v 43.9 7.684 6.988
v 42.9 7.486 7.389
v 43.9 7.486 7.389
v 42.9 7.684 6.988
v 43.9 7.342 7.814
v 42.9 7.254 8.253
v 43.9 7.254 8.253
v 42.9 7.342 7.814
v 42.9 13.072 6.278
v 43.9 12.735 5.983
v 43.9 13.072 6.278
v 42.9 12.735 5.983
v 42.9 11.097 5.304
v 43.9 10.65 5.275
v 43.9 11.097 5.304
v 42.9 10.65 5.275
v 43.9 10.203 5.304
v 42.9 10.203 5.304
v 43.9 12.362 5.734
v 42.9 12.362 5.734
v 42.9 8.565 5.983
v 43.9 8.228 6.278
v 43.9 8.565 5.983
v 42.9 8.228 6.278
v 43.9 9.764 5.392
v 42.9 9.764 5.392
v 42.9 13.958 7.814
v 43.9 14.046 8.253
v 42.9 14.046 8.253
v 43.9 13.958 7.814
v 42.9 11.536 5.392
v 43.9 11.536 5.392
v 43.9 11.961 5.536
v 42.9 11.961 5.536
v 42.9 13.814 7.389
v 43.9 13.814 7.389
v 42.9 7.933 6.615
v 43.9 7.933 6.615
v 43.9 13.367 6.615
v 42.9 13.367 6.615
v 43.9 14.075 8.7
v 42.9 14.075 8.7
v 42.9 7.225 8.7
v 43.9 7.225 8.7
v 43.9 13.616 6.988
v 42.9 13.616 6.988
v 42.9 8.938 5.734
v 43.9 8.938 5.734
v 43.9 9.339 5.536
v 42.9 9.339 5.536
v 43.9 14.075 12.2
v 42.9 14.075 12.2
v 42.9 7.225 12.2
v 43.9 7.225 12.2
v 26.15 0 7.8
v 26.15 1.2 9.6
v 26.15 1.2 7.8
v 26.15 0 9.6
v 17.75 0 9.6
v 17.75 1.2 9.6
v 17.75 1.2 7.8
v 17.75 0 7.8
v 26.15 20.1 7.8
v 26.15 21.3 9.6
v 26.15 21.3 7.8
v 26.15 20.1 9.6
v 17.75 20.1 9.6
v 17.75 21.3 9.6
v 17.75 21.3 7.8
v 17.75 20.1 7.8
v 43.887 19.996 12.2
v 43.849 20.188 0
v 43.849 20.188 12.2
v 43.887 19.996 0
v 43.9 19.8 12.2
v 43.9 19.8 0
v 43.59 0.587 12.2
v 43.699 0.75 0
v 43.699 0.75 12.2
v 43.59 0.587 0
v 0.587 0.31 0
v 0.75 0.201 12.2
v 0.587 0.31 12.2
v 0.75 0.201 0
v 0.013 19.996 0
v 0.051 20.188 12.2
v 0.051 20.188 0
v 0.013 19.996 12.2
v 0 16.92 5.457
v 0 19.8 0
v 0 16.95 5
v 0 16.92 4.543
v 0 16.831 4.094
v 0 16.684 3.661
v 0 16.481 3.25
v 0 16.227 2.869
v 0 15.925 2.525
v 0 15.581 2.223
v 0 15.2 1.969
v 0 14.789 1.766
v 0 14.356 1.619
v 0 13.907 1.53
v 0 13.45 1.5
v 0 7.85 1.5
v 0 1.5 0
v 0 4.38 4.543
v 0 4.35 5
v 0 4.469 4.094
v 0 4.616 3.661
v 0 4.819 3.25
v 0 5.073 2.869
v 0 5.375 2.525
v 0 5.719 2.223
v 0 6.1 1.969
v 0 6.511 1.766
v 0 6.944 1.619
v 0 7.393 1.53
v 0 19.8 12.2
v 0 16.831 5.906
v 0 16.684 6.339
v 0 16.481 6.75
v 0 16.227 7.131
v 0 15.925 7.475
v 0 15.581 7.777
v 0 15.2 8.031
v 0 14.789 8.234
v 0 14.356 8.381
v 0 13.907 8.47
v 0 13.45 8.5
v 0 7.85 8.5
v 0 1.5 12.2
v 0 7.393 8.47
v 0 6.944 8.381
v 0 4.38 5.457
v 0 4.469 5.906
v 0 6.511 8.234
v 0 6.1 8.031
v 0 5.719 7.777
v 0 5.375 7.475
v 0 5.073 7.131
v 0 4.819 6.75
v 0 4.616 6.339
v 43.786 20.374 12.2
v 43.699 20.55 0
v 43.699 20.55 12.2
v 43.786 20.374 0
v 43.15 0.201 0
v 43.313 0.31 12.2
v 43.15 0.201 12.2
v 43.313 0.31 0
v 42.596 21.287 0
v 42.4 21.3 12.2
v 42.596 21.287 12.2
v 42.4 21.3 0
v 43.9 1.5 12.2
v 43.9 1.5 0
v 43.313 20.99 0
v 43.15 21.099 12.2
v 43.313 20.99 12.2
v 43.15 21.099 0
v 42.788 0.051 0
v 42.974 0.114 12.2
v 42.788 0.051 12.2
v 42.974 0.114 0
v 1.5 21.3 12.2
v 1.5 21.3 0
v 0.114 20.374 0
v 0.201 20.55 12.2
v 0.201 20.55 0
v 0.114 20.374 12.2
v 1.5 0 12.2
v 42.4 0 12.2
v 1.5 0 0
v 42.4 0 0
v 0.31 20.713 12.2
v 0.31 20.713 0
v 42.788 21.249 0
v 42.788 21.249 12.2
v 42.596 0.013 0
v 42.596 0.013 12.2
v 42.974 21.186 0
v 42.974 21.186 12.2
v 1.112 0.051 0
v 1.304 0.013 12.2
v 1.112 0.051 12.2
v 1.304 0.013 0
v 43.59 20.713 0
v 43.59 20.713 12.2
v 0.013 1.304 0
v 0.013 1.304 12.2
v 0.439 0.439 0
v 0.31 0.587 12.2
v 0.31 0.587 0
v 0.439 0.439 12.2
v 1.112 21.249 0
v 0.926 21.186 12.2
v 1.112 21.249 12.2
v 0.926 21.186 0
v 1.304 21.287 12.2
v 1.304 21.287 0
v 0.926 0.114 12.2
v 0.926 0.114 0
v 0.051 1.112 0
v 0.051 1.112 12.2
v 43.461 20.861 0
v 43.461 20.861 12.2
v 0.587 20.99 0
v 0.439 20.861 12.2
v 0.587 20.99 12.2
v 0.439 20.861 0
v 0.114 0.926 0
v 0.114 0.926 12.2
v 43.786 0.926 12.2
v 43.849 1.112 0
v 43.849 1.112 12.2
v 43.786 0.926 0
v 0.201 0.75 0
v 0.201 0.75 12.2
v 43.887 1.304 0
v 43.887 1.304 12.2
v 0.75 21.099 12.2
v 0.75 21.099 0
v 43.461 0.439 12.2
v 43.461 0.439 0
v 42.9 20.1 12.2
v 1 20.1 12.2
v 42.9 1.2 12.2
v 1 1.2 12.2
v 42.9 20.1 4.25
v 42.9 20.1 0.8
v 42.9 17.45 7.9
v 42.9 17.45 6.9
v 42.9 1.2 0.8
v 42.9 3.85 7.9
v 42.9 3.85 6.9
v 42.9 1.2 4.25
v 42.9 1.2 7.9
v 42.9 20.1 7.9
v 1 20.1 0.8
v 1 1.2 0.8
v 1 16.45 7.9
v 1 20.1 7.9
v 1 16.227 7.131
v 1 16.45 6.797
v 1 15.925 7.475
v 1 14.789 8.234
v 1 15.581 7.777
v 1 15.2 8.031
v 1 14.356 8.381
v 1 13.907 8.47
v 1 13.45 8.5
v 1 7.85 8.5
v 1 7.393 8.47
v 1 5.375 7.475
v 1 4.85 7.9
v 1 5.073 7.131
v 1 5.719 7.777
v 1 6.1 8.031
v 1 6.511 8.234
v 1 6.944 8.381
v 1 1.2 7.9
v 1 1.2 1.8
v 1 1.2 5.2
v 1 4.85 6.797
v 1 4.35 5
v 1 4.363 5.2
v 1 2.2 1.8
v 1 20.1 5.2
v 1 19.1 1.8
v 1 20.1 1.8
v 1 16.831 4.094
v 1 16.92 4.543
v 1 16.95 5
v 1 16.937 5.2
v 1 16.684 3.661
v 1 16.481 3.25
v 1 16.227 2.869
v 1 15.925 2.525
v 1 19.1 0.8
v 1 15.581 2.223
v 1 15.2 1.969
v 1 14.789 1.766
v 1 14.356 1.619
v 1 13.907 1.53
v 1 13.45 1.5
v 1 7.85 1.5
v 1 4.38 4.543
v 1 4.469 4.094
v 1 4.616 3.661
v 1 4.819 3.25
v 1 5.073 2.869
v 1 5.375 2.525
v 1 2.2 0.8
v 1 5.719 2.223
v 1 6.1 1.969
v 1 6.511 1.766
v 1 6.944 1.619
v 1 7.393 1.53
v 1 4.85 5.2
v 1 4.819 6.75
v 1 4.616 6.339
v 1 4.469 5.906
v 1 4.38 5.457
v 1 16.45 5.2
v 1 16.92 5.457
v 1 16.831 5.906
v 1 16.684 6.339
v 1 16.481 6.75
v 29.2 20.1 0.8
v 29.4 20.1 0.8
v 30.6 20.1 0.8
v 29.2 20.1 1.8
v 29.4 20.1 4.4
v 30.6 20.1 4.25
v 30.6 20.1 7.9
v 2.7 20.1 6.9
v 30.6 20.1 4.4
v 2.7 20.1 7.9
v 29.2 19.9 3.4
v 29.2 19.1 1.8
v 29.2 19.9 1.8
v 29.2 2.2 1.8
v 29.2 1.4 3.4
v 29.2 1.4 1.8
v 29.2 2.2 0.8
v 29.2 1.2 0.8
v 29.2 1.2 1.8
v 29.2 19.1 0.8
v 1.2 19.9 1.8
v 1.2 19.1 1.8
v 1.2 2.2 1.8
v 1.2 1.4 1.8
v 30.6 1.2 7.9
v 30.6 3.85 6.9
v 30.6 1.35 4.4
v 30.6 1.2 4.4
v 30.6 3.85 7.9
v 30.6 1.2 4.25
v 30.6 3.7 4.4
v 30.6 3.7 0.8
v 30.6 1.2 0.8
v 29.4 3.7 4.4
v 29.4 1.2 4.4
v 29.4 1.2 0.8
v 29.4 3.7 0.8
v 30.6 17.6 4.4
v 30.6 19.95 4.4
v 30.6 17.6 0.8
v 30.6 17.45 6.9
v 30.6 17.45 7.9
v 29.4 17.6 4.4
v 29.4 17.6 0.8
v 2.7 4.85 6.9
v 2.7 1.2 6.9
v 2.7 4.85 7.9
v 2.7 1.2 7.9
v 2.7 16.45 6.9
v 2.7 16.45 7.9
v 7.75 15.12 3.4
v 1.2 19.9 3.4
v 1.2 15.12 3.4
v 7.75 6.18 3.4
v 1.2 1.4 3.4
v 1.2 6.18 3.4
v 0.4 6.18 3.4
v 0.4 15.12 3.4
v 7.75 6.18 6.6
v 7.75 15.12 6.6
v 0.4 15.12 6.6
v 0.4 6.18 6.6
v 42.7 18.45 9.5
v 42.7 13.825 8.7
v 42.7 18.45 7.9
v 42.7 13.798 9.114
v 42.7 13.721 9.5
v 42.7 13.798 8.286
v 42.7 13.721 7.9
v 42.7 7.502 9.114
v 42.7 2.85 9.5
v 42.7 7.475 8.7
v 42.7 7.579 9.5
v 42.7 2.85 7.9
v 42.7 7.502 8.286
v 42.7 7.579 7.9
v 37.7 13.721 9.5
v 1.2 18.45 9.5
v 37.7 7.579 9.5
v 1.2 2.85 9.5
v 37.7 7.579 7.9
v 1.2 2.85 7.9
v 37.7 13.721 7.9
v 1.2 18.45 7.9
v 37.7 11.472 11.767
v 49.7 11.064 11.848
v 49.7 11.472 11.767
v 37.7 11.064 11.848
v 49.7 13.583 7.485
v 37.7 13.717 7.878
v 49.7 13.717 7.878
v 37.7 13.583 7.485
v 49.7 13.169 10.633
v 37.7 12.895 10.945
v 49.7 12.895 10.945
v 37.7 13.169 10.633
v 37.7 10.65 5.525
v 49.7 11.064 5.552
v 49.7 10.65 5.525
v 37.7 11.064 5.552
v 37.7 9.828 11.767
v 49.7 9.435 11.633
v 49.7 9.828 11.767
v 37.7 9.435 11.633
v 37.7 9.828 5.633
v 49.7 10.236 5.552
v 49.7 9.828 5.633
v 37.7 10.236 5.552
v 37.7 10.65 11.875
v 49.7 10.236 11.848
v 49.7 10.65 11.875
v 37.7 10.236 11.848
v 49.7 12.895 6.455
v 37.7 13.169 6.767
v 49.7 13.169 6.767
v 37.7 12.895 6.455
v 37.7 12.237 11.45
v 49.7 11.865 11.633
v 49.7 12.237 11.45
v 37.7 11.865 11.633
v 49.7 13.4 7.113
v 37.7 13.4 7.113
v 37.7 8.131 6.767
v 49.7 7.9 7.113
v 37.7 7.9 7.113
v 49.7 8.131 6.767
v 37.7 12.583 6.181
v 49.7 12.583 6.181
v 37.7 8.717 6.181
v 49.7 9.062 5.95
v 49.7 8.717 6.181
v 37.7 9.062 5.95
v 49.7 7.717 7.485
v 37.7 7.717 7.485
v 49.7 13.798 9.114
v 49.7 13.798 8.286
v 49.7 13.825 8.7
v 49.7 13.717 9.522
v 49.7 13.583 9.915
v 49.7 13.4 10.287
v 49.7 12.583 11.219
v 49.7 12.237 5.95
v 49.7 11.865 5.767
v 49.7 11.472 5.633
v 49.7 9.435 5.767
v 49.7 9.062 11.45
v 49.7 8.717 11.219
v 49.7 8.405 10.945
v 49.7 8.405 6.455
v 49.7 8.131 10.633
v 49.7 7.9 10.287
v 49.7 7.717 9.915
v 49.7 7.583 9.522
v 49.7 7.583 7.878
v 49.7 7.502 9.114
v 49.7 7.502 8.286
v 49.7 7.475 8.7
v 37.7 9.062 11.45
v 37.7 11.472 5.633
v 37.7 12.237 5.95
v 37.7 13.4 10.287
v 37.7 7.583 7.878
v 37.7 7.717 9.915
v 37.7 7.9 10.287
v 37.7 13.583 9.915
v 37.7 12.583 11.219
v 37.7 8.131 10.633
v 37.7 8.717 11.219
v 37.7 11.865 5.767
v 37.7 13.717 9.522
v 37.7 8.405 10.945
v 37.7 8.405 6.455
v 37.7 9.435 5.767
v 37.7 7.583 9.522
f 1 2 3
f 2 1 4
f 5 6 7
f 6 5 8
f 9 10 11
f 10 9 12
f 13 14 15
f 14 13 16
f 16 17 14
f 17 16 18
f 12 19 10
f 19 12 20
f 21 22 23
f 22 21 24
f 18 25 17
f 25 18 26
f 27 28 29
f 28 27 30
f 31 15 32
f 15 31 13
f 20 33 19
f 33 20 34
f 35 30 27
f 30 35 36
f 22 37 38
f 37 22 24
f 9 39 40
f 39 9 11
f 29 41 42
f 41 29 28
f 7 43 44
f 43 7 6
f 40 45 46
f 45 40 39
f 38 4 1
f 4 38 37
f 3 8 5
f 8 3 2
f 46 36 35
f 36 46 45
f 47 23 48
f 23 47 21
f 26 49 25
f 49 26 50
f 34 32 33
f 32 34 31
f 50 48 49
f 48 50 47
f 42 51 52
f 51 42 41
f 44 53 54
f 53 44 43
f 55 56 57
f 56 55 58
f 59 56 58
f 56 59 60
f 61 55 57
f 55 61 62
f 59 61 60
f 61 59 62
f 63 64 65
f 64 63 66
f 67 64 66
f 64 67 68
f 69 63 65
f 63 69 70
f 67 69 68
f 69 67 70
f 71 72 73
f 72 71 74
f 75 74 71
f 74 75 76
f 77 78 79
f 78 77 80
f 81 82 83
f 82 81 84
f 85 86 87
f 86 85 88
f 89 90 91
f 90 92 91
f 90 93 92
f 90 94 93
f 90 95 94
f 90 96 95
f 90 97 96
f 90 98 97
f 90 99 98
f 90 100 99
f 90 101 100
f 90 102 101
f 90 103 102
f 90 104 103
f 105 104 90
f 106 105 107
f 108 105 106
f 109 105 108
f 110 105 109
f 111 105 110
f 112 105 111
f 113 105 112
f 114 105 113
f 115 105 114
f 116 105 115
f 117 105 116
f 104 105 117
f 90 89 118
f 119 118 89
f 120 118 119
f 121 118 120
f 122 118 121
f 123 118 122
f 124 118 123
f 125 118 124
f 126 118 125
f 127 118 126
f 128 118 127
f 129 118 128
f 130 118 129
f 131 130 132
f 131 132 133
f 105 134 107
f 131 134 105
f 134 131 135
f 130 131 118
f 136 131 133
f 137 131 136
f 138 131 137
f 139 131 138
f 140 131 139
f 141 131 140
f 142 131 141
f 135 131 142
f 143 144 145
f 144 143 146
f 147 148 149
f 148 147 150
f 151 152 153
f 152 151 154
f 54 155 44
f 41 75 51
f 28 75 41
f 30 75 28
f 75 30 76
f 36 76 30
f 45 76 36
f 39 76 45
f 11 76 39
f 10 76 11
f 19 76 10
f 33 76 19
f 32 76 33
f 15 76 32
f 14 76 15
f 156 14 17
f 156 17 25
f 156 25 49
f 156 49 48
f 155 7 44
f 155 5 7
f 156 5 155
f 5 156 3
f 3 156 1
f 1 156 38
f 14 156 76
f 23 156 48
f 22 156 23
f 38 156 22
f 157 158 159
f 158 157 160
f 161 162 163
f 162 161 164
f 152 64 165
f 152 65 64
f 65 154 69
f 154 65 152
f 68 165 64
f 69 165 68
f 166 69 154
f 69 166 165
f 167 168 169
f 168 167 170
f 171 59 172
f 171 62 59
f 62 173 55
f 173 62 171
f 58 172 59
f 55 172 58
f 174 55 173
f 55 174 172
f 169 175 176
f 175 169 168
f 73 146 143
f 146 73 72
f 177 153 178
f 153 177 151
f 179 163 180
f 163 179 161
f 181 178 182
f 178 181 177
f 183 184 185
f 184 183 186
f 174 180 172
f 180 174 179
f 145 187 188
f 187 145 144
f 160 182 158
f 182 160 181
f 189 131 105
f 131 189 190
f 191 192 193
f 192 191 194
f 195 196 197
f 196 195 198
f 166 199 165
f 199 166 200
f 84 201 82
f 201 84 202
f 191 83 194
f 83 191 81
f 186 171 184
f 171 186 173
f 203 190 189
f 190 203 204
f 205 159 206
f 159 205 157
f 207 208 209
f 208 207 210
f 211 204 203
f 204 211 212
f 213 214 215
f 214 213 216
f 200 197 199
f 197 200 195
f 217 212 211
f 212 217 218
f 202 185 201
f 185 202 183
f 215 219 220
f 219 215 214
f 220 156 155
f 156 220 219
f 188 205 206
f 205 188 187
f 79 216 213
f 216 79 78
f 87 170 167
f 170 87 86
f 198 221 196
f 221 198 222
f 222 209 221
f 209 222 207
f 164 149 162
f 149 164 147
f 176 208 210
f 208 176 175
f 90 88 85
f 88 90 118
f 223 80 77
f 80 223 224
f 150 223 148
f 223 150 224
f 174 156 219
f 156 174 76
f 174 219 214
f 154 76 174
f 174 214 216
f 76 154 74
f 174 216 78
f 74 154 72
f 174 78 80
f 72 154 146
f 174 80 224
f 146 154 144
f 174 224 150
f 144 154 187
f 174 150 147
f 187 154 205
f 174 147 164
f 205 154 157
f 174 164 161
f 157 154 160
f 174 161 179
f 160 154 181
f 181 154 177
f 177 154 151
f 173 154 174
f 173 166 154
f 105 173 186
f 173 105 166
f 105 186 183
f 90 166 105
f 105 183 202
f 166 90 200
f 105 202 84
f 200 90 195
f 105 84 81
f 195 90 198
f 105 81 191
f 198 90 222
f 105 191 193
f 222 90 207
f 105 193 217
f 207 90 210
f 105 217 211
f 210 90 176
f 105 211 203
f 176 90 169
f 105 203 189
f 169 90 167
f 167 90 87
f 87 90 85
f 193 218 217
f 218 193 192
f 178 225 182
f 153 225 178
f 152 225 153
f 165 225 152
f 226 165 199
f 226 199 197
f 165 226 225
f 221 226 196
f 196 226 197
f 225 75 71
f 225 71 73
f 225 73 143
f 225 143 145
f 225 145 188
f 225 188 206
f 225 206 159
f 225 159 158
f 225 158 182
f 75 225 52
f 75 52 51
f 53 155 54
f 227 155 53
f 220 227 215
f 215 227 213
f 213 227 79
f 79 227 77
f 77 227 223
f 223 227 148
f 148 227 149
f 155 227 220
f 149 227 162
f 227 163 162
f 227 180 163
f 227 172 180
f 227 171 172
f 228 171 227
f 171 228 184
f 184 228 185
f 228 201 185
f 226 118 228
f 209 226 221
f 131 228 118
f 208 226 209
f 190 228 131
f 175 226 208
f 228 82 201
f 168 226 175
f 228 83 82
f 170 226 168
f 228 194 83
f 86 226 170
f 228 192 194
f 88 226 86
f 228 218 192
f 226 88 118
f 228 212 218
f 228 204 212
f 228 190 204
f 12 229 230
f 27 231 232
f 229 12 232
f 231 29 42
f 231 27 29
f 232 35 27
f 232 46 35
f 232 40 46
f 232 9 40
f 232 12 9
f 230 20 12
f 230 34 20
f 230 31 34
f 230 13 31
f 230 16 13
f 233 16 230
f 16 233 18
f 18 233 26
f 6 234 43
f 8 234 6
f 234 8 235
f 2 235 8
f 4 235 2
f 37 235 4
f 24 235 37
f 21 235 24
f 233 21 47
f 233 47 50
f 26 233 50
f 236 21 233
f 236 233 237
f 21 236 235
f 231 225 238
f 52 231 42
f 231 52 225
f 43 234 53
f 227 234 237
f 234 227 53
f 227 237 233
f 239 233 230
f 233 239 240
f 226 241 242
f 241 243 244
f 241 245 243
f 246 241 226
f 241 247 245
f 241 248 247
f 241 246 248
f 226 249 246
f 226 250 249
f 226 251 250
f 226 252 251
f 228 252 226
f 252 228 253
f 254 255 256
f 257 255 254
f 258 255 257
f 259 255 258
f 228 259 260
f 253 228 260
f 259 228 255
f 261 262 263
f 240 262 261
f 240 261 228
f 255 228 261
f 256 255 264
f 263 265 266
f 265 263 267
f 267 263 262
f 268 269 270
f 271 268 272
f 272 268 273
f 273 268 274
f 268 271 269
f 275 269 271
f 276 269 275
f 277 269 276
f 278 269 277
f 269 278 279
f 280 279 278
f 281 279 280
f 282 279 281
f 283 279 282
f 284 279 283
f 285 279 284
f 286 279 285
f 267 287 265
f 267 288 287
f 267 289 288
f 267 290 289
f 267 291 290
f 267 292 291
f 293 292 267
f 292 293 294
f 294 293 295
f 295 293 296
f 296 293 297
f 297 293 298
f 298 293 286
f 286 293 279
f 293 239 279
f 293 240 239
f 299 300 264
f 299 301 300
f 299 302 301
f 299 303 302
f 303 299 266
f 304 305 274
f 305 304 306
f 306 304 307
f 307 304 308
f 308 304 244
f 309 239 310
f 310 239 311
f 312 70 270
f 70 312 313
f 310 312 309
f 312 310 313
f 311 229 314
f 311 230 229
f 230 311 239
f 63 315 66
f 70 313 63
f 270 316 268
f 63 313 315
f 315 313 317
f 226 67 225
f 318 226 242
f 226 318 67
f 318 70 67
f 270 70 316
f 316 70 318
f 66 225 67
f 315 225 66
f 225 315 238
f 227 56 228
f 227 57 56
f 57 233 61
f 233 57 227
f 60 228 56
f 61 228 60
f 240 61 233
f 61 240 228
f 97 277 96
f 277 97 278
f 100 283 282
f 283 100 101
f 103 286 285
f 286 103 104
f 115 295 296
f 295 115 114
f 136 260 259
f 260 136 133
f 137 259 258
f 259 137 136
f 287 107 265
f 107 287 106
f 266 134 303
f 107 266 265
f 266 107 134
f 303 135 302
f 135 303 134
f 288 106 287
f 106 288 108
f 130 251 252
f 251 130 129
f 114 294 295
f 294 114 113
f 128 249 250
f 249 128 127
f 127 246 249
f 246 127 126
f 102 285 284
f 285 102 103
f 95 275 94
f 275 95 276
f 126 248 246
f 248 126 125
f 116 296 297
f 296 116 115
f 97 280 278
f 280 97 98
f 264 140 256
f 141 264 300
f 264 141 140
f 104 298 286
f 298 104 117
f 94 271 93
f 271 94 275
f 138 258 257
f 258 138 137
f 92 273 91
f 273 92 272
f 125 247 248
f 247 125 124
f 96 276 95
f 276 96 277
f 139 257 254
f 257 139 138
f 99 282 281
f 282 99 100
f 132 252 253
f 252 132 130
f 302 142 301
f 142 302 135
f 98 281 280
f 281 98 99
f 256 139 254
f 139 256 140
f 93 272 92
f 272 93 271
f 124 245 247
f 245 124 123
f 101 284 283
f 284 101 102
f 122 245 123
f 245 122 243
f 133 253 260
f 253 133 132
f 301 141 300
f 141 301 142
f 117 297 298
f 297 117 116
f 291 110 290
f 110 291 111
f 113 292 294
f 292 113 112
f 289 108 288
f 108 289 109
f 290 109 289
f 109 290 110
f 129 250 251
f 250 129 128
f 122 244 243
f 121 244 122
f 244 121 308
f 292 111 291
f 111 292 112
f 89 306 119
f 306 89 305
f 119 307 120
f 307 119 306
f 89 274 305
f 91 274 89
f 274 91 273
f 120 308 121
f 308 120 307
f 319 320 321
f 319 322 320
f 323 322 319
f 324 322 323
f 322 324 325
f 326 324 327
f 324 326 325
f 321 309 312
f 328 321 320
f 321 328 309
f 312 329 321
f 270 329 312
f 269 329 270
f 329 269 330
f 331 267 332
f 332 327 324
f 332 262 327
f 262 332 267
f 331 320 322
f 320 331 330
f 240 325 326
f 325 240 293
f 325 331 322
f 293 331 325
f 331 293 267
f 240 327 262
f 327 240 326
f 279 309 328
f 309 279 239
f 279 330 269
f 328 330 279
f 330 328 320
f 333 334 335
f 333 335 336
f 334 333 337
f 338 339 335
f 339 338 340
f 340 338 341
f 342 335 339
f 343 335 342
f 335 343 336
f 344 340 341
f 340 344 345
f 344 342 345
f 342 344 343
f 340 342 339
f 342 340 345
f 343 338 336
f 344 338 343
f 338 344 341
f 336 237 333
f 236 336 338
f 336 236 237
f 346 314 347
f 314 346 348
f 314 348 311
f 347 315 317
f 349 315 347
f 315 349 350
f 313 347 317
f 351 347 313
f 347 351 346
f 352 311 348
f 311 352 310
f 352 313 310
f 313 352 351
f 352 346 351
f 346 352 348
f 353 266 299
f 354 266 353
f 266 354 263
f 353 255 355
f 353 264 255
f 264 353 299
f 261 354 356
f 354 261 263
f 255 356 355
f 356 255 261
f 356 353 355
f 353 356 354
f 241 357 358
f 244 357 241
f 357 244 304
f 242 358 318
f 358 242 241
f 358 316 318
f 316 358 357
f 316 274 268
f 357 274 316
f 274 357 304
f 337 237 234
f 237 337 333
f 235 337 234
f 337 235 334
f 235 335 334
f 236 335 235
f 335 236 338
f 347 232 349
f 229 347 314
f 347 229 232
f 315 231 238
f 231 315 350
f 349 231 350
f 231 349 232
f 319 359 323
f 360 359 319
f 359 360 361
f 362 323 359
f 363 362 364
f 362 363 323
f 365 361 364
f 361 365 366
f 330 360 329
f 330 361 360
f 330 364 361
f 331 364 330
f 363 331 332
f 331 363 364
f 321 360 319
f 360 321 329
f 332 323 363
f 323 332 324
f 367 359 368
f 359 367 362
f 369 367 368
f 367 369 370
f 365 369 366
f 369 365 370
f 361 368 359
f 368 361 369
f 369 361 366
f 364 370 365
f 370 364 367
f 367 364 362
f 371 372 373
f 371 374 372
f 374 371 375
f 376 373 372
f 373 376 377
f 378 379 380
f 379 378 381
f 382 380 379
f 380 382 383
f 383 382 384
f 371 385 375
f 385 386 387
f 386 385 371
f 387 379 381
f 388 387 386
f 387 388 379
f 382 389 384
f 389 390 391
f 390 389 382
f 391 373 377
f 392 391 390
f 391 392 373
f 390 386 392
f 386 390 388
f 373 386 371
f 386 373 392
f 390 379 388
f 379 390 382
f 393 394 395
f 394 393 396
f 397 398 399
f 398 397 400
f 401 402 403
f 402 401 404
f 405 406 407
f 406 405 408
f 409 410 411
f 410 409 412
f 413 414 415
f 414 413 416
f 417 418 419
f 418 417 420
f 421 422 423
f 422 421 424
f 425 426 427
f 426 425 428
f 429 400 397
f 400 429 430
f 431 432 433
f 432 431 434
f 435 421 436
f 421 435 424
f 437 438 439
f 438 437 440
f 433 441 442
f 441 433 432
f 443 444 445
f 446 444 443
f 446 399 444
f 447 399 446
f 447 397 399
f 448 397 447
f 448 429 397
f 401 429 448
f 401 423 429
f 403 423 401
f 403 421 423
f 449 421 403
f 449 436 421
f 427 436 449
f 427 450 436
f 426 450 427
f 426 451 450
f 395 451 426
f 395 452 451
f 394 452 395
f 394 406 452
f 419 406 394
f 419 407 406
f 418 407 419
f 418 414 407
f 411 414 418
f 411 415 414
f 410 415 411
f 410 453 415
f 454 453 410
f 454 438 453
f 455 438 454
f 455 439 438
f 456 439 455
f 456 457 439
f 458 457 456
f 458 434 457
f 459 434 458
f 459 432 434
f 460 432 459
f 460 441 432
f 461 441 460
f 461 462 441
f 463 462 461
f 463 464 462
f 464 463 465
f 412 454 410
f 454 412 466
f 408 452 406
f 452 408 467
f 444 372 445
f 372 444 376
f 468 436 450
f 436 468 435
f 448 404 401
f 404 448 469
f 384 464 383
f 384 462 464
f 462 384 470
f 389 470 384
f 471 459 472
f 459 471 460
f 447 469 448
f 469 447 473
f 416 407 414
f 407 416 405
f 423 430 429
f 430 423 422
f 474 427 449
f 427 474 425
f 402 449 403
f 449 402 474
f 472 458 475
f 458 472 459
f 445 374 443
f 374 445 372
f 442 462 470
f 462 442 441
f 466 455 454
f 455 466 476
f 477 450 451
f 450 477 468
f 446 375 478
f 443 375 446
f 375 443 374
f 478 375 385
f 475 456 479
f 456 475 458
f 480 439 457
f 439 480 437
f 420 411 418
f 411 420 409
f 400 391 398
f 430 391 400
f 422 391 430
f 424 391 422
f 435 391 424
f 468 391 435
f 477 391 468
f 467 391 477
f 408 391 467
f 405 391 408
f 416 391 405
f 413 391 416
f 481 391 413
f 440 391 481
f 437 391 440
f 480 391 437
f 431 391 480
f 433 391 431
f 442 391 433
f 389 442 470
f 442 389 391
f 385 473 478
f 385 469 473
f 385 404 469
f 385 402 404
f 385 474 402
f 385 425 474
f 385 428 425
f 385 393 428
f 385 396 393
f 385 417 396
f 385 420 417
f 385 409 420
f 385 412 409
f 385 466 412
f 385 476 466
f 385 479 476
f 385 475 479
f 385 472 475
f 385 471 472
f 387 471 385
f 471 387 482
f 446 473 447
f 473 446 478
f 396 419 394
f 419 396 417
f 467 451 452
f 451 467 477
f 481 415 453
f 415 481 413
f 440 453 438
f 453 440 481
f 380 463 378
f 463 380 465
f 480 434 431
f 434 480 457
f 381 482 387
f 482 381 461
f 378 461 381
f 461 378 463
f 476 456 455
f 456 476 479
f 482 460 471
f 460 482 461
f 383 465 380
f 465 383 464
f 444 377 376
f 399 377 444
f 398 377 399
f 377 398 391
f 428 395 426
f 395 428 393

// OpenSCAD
// Case for the nrf24-usb-bridge dongle: a Tenstar "Mini STM32F103C8T6" board
// at the bottom and the nRF24L01+PA+LNA (SMA) module stacked above it.
//
//   USB-C end (x = 0)                                   SMA end
//   ┌──────────────────────────────────────────────────────┐
//   │  ┌──────────── nRF24 PA+LNA, components up ───────────┤══ SMA
//   │  └─────────────────────────────────────────────────── │
//   │    wires                        free: bulk cap, LDO   │
//  ═╪ ┌── STM32 mini ──┐ SWD pins →                         │
//   └──────────────────────────────────────────────────────┘
//
// MEASURE YOUR BOARDS and fix the "Boards" values below before printing;
// the defaults are estimates. Everything else follows from them.
//
// Render:  openscad -D 'part="base"' -o base.stl bridge_case.scad
//          openscad -D 'part="lid"'  -o lid.stl  bridge_case.scad
// Print:   base upright, lid flat side down. 0.2 mm layers, no supports.

part = "assembly";   // "base" | "lid" | "assembly"

/* ---------- Boards (measure!) ---------- */
stm_l      = 28.0;  // STM32 board length, USB edge to SWD-header edge
stm_w      = 18.5;  // STM32 board width
stm_t      = 1.6;   // PCB thickness
stm_under  = 1.0;   // tallest part on the STM32 board's underside (0 if none)
usb_y      = 0;     // USB-C centre offset from the board's centreline (+y = left, seen from USB end)
usb_z      = 1.6;   // USB-C receptacle centre above the PCB's top face (top-mount C ≈ 1.6)

nrf_l      = 41.5;  // nRF module PCB length (without SMA thread)
nrf_w      = 15.6;  // nRF module PCB width
nrf_t      = 1.6;
nrf_top    = 2.6;   // tallest part on the nRF top side (the SMA body sticks up ~2.4 above the PCB)
sma_d      = 6.35;  // SMA thread diameter (1/4")
sma_beyond = 0.0;   // how far the SMA's square body sticks out past the nRF PCB edge

gap        = 4.5;   // STM32 top face to nRF bottom face: USB-C receptacle (3.2) + nRF header solder stubs

/* ---------- Case ---------- */
tol     = 0.2;   // clearance around each board
wall    = 1.2;
end_w   = 1.0;   // thinner end walls: USB plug and SMA thread need reach
floor_t = 0.8;
lid_t   = 0.8;
lip     = 1.5;   // depth of the lid's insert lip
lip_tol = 0.15;  // lid lip clearance
snap_w  = 8.0;   // snap tab width (one tab per long side, mid-length)
snap_t  = 0.8;   // tab thickness: thinner = easier click, weaker hold
snap_l  = 4.5;   // tab length below the lid
snap_b  = 0.35;  // how far the catch sticks out into the wall's window
plug_w  = 12.6;  // USB-C plug overmould opening
plug_h  = 7.0;
r_out   = 1.5;   // outer corner radius
led_x   = -1;    // >= 0: LED window in the +y side wall, x from inner USB wall (-1 = none)
$fn = 48;

/* ---------- Derived ---------- */
assert(nrf_l >= stm_l, "layout assumes the nRF module is longer than the STM32 board");
in_l = nrf_l + sma_beyond + 2 * tol;
in_w = max(stm_w, nrf_w) + 2 * tol;
z_stm  = stm_under;                 // STM32 PCB bottom (inner floor = 0)
z_stmt = z_stm + stm_t;             // STM32 PCB top
z_nrf  = z_stmt + gap;              // nRF PCB bottom
z_nrft = z_nrf + nrf_t;             // nRF PCB top
in_h   = z_nrft + nrf_top + 0.1;
sma_z  = z_nrf + nrf_t / 2;
nrf_x0 = in_l - tol - sma_beyond - nrf_l;   // nRF pushed to the SMA end

out_l = in_l + 2 * end_w;
out_w = in_w + 2 * wall;
out_h = floor_t + in_h;             // base height; lid sits on top

snap_x  = (in_l - snap_w) / 2;
snap_zt = in_h - snap_l;            // tab tip
// catch profile on the y = 0 side, (y, z): gentle lead-in below, 45° lock face above
snap_profile = [[lip_tol, snap_zt + 0.2], [lip_tol - snap_b, snap_zt + 1.2],
                [lip_tol - snap_b, snap_zt + 1.4], [lip_tol, snap_zt + 1.4 + snap_b]];
module both_sides() { children(); translate([0, in_w, 0]) mirror([0, 1, 0]) children(); }

echo(str("Outside: ", out_l, " x ", out_w, " x ", out_h + lid_t, " mm"));

module rbox(l, w, h, r) {
    hull() for (x = [r, l - r], y = [r, w - r]) translate([x, y, 0]) cylinder(r = r, h = h);
}

// Inner-cavity coordinates: origin at the inner floor's USB-end corner.
module inner() { translate([end_w, wall, floor_t]) children(); }

// Ledge along a wall with a 45° chamfer underneath, so it prints without support.
module ledge(len, depth, top_z) {
    translate([0, 0, top_z - depth - 1])
        rotate([90, 0, 90]) linear_extrude(len)
            polygon([[0, 0], [depth, depth], [depth, depth + 1], [0, depth + 1]]);
}

module base() {
    difference() {
        rbox(out_l, out_w, out_h, r_out);
        inner() cube([in_l, in_w, in_h + 1]);
        // USB-C plug opening, centred on the receptacle
        inner() translate([-end_w - 1, in_w / 2 + usb_y, z_stmt + usb_z])
            rotate([0, 90, 0]) hull() for (dy = [-(plug_w - plug_h) / 2, (plug_w - plug_h) / 2])
                translate([0, dy, 0]) cylinder(d = plug_h, h = end_w + 2);
        // SMA slot, open to the top; the lid's tongue closes it
        inner() translate([in_l - 1, in_w / 2, sma_z]) {
            rotate([0, 90, 0]) cylinder(d = sma_d + 0.5, h = end_w + 2);
            translate([0, -(sma_d + 0.5) / 2, 0]) cube([end_w + 2, sma_d + 0.5, in_h]);
        }
        // snap windows: the lid's catches click into these; push a pin in to release
        inner() both_sides() translate([snap_x - 0.2, -wall - 1, snap_zt + 0.1])
            cube([snap_w + 0.4, wall + 1.01, 1.4 + snap_b + 0.05]);
        // optional LED window
        if (led_x >= 0) inner() translate([led_x - 1, in_w - 1, z_stmt])
            cube([2, wall + 2, 2]);
    }
    inner() {
        // STM32 support ledges along both long sides (keep the middle free for underside parts)
        for (y = [0, in_w - tol - 0.8]) translate([0, y, 0]) cube([stm_l + tol, tol + 0.8, z_stm]);
        // STM32 end stop beside the SWD header (corners only)
        for (y = [0, in_w - 2.5]) translate([stm_l + 2 * tol, y, 0]) cube([1.2, 2.5, z_stmt + 1]);

        // nRF rails along the long walls, past the STM32 board (wires live above the STM32)
        nrf_side = (in_w - nrf_w) / 2;
        rail_x0  = stm_l + 2 * tol + 1.2;
        rail_d   = nrf_side + 1.0;
        translate([rail_x0, 0, 0]) ledge(in_l - rail_x0, rail_d, z_nrf);
        translate([in_l, in_w, 0]) rotate([0, 0, 180]) ledge(in_l - rail_x0, rail_d, z_nrf);
        // nRF corner pads on the USB end wall (corners only: the nRF header is mid-width)
        pad_w = nrf_side + 2;
        pad_d = nrf_x0 + 1.5;
        for (y = [0, in_w - pad_w]) translate([0, y + pad_w, 0]) rotate([90, 0, 0])
            linear_extrude(pad_w) polygon([[0, z_nrf - pad_d - 1], [pad_d, z_nrf - 1], [pad_d, z_nrf], [0, z_nrf]]);
    }
}

module lid() {
    // built upside up in place; the "lid" part flips it for printing
    translate([0, 0, out_h]) rbox(out_l, out_w, lid_t, r_out);
    inner() {
        // insert lip (a frame)
        translate([0, 0, in_h - lip]) difference() {
            translate([lip_tol, lip_tol, 0]) cube([in_l - 2 * lip_tol, in_w - 2 * lip_tol, lip]);
            translate([1.2 + lip_tol, 1.2 + lip_tol, -1]) cube([in_l - 2.4 - 2 * lip_tol, in_w - 2.4 - 2 * lip_tol, lip + 2]);
            // slits so the snap tabs flex free of the lip
            both_sides() translate([snap_x - 0.5, -1, -1]) cube([snap_w + 1, 3, lip + 2]);
        }
        // snap tabs with their catches
        both_sides() {
            translate([snap_x, lip_tol, snap_zt]) cube([snap_w, snap_t, snap_l + 0.01]);
            translate([snap_x, 0, 0]) rotate([90, 0, 90]) linear_extrude(snap_w) polygon(snap_profile);
        }
        // hold-down ribs on the nRF's long edges (stop short of the SMA body)
        nrf_side = (in_w - nrf_w) / 2;
        for (y = [nrf_side + 0.2, in_w - nrf_side - 1.0])
            translate([nrf_x0 + 1, y, z_nrft + 0.1]) cube([nrf_l - 9, 0.8, in_h - z_nrft]);
        // tongue closing the SMA slot
        translate([in_l - 0.01, in_w / 2, 0]) difference() {
            translate([0, -(sma_d + 0.5) / 2 + lip_tol, sma_z]) cube([end_w + 0.01, sma_d + 0.5 - 2 * lip_tol, in_h - sma_z]);
            translate([-1, 0, sma_z]) rotate([0, 90, 0]) cylinder(d = sma_d + 0.5, h = end_w + 2);
        }
    }
}

module stm_dummy() inner() {
    color("seagreen") translate([tol, (in_w - stm_w) / 2, z_stm]) cube([stm_l, stm_w, stm_t]);
    color("silver") translate([-0.6, in_w / 2 + usb_y - 4.47, z_stmt]) cube([7.35, 8.94, 3.2]);
}
module nrf_dummy() inner() {
    color("black") translate([nrf_x0, (in_w - nrf_w) / 2, z_nrf]) cube([nrf_l, nrf_w, nrf_t]);
    color("gold") translate([nrf_x0 + nrf_l - 5, in_w / 2, sma_z]) rotate([0, 90, 0]) cylinder(d = sma_d, h = 12);
}

if (part == "base") base();
else if (part == "lid") translate([0, out_w, out_h + lid_t]) rotate([180, 0, 0]) lid();
else { base(); stm_dummy(); nrf_dummy(); %lid(); }
